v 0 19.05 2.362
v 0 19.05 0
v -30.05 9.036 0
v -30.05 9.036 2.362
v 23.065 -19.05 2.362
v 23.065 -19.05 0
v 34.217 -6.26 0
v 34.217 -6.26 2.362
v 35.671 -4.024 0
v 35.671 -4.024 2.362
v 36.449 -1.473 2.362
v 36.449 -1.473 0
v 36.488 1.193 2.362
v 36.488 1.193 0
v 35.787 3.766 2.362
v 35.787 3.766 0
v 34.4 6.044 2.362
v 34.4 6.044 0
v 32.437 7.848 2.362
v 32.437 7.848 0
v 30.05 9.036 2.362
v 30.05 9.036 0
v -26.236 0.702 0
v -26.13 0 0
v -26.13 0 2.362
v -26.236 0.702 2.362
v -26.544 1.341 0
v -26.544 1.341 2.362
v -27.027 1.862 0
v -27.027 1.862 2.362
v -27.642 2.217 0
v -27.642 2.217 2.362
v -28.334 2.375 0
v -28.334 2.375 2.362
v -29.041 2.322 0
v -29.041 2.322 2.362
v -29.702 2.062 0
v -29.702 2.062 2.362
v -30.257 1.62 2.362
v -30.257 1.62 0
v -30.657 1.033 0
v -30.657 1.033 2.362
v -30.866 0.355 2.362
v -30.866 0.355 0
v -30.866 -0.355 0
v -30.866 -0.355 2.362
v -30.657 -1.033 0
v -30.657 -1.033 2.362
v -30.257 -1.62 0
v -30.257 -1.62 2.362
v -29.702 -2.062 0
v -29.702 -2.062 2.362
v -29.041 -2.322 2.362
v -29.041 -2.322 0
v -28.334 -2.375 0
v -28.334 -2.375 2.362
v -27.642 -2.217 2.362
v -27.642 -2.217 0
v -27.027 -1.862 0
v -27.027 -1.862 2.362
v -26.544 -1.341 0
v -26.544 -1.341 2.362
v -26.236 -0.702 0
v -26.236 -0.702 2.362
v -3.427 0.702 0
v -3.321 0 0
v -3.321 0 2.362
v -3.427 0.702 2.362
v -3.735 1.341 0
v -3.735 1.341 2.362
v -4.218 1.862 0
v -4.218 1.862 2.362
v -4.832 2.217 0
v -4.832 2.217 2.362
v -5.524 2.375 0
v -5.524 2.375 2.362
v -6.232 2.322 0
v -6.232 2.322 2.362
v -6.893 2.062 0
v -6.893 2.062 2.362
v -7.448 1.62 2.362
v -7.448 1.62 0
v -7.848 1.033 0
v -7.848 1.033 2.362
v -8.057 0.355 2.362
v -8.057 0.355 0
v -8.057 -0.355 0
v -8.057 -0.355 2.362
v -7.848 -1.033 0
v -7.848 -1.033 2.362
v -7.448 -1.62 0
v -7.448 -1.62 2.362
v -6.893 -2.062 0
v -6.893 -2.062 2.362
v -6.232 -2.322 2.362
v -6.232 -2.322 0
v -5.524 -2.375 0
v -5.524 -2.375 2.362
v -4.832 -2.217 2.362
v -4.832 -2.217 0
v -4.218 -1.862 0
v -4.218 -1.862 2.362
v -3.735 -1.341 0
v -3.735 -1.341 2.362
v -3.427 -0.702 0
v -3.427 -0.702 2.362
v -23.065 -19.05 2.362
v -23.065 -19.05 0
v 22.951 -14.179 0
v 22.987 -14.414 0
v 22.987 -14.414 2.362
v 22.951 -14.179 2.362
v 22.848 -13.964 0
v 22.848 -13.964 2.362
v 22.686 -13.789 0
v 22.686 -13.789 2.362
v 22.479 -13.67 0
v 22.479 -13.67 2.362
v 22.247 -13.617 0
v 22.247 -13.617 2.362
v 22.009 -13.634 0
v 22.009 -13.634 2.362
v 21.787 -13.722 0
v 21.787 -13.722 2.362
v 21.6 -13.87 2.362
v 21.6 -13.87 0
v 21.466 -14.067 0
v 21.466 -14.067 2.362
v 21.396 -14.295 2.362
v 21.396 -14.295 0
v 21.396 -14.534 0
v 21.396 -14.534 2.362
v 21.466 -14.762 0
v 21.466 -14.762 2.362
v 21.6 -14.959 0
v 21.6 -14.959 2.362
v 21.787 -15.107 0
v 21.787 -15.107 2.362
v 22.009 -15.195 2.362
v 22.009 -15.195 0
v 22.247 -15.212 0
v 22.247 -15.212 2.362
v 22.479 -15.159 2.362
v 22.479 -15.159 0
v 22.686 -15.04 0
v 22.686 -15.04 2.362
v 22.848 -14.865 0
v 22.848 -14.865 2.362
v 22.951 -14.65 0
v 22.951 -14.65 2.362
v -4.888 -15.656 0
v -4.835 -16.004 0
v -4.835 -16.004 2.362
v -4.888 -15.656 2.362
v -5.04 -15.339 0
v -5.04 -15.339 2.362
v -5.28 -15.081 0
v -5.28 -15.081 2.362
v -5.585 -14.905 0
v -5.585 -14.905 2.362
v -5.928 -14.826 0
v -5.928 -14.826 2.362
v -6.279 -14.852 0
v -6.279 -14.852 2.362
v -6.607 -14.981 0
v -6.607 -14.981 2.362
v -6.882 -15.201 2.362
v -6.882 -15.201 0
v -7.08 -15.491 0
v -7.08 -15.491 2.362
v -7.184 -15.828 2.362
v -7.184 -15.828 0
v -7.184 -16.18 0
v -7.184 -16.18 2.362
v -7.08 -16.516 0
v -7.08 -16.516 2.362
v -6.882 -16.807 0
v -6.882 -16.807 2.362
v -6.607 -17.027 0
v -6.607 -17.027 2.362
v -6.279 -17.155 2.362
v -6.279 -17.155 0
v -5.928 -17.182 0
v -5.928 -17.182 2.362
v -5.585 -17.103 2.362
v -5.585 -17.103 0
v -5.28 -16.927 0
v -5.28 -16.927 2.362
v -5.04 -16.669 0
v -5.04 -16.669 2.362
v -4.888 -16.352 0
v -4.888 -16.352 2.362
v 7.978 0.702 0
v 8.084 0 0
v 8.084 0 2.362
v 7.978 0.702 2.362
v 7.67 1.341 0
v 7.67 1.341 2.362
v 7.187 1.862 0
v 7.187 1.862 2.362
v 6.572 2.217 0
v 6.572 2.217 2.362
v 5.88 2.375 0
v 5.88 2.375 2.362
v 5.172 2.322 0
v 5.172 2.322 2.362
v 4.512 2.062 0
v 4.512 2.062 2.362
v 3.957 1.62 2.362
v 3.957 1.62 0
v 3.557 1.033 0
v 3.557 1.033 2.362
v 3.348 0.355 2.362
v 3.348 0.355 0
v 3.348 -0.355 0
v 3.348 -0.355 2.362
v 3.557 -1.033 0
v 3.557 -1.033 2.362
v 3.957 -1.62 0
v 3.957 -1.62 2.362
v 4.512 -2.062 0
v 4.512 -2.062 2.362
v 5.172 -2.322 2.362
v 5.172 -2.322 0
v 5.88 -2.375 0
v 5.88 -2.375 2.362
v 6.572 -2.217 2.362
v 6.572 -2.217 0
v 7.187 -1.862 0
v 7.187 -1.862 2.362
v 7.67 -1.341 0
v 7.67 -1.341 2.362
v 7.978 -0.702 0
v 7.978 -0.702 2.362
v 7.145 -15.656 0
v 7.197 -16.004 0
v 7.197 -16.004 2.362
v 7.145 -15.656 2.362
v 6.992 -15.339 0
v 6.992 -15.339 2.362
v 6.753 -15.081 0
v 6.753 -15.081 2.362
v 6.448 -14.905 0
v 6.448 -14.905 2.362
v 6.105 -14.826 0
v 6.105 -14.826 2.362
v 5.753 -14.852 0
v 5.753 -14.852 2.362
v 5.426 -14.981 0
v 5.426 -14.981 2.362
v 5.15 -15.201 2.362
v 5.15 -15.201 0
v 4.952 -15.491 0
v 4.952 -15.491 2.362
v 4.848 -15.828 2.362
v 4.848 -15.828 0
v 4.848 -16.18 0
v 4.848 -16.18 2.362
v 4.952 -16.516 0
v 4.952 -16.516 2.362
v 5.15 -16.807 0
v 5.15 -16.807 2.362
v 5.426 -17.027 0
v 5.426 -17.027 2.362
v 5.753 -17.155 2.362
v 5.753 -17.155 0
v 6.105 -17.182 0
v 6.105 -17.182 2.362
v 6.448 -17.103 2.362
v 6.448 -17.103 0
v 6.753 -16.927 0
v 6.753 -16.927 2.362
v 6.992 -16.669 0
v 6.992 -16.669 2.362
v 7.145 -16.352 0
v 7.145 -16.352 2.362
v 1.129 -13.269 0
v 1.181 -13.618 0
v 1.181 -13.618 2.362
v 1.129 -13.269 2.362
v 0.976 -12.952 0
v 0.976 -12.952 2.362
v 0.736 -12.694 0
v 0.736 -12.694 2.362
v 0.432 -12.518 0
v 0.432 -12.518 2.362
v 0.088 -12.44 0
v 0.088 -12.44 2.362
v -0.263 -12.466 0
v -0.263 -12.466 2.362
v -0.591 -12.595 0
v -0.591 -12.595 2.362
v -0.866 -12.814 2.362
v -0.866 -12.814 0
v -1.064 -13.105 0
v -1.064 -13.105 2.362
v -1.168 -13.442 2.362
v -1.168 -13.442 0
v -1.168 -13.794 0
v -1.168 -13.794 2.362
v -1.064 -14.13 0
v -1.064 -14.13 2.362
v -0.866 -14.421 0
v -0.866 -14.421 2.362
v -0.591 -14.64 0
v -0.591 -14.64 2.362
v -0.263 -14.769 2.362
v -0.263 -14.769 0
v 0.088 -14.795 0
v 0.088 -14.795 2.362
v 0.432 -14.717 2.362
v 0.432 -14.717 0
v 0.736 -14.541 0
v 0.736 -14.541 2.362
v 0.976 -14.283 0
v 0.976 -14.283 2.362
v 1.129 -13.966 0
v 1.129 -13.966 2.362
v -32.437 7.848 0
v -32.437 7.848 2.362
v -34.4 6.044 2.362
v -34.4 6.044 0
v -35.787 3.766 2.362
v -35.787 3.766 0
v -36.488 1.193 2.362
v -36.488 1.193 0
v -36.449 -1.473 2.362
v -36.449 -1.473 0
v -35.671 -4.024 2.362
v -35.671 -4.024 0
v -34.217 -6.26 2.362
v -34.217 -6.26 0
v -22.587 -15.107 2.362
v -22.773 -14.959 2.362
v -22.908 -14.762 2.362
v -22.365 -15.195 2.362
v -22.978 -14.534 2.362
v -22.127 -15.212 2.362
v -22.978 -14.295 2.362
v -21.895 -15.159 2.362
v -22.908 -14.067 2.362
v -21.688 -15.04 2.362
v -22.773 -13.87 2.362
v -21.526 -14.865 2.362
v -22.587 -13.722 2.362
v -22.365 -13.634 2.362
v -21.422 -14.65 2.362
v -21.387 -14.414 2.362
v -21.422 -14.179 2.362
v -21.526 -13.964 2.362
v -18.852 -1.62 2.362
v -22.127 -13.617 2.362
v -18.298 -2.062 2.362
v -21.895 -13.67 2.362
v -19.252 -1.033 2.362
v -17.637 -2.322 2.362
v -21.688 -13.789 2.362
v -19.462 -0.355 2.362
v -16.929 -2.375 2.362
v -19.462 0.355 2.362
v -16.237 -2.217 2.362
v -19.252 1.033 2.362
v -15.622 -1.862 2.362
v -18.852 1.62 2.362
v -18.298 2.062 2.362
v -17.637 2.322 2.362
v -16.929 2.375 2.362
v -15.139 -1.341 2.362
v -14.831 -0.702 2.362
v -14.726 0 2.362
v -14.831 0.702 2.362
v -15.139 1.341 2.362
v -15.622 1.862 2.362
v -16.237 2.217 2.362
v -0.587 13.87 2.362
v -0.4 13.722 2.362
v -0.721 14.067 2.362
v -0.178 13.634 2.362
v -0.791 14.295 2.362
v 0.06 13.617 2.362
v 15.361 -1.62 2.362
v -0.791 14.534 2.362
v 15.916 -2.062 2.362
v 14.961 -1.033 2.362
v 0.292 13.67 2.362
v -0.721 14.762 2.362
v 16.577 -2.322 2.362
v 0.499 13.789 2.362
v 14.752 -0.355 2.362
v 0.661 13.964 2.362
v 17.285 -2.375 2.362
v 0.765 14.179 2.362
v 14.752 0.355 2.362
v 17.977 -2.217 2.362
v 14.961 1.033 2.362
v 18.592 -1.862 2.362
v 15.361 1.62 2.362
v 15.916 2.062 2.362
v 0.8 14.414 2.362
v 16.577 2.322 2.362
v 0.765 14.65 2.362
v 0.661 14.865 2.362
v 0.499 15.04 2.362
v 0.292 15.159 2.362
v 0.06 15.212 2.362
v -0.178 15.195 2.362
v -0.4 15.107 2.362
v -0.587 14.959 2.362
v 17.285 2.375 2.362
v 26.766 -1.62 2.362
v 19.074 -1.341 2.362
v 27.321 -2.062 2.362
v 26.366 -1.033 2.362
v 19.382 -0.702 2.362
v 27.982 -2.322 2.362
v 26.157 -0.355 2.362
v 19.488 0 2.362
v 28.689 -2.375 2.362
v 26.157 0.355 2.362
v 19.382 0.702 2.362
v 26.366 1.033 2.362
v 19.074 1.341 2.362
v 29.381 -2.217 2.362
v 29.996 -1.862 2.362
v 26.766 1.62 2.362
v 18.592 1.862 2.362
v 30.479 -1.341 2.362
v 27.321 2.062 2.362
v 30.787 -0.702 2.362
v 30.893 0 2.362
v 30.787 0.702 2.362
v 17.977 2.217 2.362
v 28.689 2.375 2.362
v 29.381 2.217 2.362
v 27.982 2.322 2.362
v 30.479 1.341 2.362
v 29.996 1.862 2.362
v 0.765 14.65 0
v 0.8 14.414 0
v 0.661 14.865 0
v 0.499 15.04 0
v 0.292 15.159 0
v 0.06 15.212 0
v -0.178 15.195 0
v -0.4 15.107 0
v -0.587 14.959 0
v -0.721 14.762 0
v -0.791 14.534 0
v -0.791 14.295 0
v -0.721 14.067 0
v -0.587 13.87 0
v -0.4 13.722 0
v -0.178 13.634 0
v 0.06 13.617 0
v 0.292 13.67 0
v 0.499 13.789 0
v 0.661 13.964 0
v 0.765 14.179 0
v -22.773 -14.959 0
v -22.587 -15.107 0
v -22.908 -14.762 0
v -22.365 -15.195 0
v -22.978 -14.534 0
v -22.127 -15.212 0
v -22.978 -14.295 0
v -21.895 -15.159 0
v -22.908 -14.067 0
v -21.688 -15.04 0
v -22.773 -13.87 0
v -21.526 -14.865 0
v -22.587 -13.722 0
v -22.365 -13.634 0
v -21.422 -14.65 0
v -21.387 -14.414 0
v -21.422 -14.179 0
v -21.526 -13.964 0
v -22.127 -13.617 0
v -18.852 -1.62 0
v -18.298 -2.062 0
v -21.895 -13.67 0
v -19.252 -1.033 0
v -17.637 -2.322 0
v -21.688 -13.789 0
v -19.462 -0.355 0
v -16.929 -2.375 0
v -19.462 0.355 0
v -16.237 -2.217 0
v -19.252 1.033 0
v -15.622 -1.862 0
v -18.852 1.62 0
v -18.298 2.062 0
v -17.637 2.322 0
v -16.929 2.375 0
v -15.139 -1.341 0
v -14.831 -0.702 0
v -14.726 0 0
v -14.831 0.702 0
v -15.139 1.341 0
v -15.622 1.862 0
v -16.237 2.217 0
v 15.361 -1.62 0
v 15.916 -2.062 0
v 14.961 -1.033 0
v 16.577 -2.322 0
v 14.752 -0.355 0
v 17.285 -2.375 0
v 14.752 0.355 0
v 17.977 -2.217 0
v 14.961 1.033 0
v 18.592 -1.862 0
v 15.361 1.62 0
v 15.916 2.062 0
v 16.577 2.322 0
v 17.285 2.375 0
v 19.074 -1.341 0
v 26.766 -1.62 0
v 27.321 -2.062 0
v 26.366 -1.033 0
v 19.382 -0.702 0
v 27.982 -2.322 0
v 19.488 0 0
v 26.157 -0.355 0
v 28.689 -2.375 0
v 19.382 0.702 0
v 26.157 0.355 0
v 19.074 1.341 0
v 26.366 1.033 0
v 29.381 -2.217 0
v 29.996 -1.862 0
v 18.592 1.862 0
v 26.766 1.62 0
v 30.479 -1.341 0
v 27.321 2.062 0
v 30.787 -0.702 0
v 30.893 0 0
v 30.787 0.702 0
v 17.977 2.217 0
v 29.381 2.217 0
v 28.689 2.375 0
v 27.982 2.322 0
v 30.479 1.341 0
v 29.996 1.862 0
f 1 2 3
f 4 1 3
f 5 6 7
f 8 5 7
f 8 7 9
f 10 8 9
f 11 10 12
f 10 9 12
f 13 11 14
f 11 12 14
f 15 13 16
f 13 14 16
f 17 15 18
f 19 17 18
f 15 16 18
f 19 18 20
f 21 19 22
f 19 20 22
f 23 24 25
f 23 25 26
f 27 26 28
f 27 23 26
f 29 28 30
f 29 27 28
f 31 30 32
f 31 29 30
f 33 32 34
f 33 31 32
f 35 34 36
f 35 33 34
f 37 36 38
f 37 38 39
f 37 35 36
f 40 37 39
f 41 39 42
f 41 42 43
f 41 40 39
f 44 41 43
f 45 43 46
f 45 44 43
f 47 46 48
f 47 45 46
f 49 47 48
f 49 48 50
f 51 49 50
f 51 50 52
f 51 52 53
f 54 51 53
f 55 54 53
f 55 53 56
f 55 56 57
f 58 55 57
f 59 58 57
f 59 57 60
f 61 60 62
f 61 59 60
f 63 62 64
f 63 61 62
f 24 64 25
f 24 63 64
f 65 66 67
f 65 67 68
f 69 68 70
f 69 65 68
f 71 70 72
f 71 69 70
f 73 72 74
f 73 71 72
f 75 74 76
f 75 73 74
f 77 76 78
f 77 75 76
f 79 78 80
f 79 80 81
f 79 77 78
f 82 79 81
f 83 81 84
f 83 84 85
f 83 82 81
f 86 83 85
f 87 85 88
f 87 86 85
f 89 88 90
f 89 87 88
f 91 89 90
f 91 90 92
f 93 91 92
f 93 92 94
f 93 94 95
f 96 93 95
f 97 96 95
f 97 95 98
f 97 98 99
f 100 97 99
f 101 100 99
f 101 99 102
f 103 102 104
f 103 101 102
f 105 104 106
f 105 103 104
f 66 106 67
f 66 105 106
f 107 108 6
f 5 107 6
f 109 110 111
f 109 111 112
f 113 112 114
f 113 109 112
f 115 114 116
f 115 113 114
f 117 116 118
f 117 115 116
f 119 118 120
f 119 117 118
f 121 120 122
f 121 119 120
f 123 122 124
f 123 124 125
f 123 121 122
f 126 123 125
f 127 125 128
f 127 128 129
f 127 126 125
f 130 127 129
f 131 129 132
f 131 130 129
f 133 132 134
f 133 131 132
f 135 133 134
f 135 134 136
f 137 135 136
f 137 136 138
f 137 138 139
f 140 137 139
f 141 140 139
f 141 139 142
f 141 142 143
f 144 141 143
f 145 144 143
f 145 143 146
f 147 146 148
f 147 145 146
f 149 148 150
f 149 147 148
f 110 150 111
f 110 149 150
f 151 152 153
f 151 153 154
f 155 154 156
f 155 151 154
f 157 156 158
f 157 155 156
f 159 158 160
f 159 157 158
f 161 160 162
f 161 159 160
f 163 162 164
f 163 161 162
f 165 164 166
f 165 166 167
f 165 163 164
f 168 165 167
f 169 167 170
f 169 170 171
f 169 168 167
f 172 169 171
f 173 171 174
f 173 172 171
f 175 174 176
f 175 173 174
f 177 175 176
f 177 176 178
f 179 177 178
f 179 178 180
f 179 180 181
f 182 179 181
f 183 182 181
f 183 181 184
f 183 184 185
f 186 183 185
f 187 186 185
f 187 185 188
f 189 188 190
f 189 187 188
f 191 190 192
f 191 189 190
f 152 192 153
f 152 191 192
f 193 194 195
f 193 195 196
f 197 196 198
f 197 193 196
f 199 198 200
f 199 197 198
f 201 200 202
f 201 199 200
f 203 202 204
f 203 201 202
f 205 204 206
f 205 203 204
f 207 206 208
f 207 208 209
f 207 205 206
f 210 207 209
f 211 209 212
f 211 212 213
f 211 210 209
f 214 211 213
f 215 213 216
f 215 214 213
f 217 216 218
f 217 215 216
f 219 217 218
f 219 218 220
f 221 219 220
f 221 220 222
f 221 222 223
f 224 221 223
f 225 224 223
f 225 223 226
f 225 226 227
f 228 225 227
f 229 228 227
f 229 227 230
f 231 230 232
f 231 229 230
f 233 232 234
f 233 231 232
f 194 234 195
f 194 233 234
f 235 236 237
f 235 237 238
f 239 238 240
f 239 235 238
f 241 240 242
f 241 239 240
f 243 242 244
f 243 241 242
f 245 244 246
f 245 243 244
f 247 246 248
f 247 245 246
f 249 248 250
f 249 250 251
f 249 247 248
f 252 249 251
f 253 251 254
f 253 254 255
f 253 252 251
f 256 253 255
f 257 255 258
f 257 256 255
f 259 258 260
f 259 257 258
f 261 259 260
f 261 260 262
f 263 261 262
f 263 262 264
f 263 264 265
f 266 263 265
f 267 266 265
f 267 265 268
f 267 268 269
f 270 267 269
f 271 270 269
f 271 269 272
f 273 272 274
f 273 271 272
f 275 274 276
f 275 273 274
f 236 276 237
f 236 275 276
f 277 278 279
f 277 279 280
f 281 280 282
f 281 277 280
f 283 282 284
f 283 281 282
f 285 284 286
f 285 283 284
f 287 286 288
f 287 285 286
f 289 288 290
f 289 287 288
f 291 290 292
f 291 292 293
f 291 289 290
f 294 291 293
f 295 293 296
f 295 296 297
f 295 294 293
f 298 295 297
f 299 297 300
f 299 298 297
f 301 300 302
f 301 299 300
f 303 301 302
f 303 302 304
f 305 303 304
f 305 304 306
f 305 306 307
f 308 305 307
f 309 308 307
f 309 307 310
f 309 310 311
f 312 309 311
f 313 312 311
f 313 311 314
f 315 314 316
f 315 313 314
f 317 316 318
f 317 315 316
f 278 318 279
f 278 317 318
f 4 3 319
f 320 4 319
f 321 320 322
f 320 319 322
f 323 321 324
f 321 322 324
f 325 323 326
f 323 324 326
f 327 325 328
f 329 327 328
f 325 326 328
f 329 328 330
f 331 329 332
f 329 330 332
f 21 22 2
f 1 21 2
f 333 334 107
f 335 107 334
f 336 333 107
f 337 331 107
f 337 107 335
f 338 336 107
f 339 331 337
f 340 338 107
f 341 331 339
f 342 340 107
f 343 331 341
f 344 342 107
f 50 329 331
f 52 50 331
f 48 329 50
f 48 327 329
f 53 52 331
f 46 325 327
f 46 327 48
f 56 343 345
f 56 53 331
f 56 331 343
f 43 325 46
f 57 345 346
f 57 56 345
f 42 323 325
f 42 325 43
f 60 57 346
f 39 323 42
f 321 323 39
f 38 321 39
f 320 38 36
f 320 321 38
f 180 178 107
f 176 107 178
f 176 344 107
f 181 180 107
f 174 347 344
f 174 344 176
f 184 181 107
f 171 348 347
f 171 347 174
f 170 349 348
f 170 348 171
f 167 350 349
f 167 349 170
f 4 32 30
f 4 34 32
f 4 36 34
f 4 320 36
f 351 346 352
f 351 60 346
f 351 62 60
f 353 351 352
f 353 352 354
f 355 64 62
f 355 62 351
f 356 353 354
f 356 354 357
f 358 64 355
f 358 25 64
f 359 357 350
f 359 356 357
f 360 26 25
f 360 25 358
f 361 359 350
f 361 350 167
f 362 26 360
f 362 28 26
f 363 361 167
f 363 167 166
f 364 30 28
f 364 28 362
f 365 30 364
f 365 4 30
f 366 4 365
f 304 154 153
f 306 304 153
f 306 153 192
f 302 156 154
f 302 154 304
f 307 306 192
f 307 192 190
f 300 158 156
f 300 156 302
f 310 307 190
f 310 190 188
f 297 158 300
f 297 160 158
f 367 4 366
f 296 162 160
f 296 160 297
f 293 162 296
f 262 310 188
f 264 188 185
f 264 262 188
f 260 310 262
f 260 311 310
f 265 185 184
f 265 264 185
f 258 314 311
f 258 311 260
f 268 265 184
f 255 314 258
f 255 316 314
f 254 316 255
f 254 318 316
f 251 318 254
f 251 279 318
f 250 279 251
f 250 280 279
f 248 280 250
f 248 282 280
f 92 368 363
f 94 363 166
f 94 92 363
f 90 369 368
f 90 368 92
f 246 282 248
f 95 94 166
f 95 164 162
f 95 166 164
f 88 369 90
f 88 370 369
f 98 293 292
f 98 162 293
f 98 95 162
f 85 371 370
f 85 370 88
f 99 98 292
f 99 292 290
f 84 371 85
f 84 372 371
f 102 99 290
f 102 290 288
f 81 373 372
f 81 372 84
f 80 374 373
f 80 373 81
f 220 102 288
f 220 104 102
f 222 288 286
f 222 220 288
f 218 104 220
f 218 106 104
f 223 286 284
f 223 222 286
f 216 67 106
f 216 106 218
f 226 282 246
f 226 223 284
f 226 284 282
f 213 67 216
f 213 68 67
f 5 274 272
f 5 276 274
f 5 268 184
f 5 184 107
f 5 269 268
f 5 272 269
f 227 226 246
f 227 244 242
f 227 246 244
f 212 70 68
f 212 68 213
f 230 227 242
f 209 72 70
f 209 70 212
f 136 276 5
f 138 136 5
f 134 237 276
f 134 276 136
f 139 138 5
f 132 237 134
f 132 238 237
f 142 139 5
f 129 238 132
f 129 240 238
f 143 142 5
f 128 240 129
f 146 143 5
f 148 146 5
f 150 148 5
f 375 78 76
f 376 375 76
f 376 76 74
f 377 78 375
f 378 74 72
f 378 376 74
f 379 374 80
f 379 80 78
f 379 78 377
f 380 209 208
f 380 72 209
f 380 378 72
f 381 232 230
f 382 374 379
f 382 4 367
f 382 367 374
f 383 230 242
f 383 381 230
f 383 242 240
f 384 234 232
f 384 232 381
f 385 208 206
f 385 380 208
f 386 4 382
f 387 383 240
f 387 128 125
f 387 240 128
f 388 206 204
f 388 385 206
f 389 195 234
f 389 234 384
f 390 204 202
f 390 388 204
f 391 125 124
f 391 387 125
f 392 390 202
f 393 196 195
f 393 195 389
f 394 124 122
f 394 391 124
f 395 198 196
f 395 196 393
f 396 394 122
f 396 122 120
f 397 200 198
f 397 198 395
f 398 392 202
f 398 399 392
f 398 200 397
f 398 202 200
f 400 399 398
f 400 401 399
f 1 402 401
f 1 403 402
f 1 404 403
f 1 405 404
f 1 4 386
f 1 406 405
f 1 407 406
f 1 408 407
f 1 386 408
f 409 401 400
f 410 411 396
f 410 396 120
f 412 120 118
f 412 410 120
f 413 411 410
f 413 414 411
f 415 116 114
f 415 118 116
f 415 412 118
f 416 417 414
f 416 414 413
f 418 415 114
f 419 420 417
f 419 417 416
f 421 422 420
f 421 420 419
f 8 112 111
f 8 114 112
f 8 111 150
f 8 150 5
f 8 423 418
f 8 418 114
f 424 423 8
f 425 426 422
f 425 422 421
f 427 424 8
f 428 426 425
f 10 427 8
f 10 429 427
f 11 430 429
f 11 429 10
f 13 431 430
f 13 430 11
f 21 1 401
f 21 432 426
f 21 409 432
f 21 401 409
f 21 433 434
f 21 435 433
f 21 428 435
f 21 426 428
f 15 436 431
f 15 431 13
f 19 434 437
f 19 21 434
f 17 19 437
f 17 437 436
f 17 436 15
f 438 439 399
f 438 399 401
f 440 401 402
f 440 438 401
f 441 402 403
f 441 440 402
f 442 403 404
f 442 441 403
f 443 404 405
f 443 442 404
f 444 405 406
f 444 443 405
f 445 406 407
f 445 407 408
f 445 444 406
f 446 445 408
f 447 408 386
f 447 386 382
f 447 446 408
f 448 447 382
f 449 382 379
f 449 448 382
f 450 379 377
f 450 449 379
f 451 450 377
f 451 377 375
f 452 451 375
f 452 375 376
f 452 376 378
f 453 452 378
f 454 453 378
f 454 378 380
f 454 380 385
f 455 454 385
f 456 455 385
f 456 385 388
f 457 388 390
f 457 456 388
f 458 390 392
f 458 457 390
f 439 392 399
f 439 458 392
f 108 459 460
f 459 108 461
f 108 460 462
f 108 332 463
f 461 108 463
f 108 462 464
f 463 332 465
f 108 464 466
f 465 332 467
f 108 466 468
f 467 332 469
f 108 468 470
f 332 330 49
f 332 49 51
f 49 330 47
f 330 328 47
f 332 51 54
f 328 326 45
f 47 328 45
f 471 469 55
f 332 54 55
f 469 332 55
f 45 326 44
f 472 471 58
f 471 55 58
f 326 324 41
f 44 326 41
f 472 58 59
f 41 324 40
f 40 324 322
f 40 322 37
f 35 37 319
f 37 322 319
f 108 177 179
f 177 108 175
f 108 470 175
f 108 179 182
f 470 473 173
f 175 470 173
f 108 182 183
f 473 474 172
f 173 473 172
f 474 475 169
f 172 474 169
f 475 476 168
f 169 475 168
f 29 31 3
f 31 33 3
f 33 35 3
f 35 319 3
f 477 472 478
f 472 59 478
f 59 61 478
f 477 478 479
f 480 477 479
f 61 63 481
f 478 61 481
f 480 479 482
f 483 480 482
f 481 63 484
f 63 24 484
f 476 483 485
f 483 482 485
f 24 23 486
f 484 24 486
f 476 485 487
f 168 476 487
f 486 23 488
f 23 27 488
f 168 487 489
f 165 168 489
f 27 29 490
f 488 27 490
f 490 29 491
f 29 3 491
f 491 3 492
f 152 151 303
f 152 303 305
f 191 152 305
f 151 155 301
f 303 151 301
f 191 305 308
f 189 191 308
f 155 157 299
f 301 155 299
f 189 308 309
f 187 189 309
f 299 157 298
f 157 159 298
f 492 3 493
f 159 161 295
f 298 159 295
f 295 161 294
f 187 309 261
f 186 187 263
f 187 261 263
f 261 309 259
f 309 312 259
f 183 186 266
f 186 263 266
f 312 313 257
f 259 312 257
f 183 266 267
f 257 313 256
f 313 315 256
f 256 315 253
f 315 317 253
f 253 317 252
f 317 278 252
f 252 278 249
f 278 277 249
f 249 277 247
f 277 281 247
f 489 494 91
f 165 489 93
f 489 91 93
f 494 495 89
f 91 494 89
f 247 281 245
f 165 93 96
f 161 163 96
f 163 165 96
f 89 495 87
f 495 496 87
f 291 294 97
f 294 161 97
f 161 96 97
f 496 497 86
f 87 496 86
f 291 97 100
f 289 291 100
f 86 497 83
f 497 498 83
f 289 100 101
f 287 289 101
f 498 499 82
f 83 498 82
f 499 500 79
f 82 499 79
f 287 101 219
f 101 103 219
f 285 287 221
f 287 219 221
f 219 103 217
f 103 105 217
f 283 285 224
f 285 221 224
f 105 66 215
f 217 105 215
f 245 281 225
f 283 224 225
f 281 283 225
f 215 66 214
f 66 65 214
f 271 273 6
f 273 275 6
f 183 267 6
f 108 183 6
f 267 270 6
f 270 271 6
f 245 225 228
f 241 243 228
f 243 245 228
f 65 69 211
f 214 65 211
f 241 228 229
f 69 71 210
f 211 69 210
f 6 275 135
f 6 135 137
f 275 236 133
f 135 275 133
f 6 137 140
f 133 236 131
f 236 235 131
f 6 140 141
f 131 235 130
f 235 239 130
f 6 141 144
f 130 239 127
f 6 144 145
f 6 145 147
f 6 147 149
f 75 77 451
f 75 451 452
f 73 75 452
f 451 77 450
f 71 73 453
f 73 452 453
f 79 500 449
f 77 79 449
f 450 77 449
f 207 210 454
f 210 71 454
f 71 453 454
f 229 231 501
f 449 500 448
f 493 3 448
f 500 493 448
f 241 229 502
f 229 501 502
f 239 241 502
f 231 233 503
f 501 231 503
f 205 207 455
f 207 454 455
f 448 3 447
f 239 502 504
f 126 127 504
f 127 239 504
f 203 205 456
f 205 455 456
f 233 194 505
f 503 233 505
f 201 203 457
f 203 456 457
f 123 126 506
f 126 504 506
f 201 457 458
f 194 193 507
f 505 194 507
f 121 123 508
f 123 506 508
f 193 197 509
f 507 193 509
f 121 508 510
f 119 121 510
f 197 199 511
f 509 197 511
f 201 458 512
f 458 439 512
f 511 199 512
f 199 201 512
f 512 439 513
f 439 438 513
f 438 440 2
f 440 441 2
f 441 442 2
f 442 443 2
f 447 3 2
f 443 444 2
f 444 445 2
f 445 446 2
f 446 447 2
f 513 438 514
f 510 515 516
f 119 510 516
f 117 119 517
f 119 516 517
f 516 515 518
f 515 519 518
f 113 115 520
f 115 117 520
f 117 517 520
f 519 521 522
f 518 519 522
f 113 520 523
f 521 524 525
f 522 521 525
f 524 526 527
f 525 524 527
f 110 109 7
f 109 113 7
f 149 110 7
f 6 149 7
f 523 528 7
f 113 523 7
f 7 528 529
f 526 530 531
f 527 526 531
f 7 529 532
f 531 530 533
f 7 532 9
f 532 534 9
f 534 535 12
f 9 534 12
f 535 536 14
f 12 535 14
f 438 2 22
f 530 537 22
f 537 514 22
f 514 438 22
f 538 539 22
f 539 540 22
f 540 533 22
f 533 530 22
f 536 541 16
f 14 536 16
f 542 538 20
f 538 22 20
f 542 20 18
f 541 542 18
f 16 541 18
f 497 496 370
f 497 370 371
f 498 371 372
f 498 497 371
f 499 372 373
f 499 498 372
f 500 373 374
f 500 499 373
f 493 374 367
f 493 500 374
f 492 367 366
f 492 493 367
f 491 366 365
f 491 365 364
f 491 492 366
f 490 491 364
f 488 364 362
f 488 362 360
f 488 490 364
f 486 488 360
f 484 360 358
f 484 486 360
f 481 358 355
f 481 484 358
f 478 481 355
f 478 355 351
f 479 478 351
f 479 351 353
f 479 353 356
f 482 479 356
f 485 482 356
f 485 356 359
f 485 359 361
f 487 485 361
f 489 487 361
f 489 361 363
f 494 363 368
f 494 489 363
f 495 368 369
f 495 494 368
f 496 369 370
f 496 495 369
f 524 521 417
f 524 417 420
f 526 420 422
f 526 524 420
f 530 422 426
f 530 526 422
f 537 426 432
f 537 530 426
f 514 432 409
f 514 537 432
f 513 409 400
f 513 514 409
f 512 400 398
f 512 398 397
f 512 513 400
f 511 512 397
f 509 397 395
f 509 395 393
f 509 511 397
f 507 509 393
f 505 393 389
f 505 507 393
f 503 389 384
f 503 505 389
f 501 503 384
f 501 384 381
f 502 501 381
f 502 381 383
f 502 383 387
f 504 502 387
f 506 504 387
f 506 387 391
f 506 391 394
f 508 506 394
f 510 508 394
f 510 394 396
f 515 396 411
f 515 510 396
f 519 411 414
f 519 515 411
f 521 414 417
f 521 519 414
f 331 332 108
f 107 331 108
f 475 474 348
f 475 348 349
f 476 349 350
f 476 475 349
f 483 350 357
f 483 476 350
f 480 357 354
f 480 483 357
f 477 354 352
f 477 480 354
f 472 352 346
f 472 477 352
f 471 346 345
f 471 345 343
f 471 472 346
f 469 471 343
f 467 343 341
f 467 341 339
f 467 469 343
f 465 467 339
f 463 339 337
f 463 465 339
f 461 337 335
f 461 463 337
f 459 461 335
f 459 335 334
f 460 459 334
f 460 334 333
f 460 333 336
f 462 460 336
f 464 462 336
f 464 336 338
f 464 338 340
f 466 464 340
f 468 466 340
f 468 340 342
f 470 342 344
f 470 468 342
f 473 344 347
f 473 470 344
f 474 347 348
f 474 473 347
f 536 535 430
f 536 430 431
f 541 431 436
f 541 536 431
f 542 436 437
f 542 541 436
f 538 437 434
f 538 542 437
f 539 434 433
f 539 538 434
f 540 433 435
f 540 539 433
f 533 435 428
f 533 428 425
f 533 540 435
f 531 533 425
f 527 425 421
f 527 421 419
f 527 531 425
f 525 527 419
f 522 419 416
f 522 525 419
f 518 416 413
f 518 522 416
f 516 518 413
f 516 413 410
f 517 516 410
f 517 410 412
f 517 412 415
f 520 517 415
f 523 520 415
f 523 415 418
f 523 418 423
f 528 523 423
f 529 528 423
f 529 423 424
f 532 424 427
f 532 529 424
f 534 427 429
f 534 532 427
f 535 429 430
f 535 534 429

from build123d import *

# Parameters (mm, degrees)
F0_R     = 0.8001
F0_R_2   = 1.1811
F0_R_3   = 2.38125
F1_DEPTH = 2.3622


with BuildPart() as f1:
    # F0 (on Top) → F1 (new body)
    with BuildSketch(Plane.XY):
        with BuildLine():
            Line((-23.064947, -19.05), (0, -19.05))
            Line((0, -19.05), (23.064947, -19.05))
            Line((23.064947, -19.05), (34.217403, -6.259881))
            ThreePointArc((34.217403, -6.259881), (36.228268, 2.504018), (30.049558, 9.036479))
            Line((30.049558, 9.036479), (0, 19.05))
            Line((0, 19.05), (-30.049558, 9.036479))
            ThreePointArc((-30.049558, 9.036479), (-36.228268, 2.504018), (-34.217403, -6.259881))
            Line((-34.217403, -6.259881), (-23.064947, -19.05))
        make_face()
        with Locations((-22.1869, -14.4145)):
            Circle(F0_R, mode=Mode.SUBTRACT)
        with Locations((-6.016295, -16.003957)):
            Circle(F0_R_2, mode=Mode.SUBTRACT)
        with Locations((6.016295, -16.003957)):
            Circle(F0_R_2, mode=Mode.SUBTRACT)
        with Locations((0, -13.617562)):
            Circle(F0_R_2, mode=Mode.SUBTRACT)
        with Locations((22.1869, -14.4145)):
            Circle(F0_R, mode=Mode.SUBTRACT)
        with Locations((-28.5115, 0)):
            Circle(F0_R_3, mode=Mode.SUBTRACT)
        with Locations((-17.1069, 0)):
            Circle(F0_R_3, mode=Mode.SUBTRACT)
        with Locations((-5.7023, 0)):
            Circle(F0_R_3, mode=Mode.SUBTRACT)
        with Locations((5.7023, 0)):
            Circle(F0_R_3, mode=Mode.SUBTRACT)
        with Locations((17.1069, 0)):
            Circle(F0_R_3, mode=Mode.SUBTRACT)
        with Locations((28.5115, 0)):
            Circle(F0_R_3, mode=Mode.SUBTRACT)
        with Locations((0, 14.4145)):
            Circle(F0_R, mode=Mode.SUBTRACT)
    extrude(amount=F1_DEPTH)


solid = f1.part
